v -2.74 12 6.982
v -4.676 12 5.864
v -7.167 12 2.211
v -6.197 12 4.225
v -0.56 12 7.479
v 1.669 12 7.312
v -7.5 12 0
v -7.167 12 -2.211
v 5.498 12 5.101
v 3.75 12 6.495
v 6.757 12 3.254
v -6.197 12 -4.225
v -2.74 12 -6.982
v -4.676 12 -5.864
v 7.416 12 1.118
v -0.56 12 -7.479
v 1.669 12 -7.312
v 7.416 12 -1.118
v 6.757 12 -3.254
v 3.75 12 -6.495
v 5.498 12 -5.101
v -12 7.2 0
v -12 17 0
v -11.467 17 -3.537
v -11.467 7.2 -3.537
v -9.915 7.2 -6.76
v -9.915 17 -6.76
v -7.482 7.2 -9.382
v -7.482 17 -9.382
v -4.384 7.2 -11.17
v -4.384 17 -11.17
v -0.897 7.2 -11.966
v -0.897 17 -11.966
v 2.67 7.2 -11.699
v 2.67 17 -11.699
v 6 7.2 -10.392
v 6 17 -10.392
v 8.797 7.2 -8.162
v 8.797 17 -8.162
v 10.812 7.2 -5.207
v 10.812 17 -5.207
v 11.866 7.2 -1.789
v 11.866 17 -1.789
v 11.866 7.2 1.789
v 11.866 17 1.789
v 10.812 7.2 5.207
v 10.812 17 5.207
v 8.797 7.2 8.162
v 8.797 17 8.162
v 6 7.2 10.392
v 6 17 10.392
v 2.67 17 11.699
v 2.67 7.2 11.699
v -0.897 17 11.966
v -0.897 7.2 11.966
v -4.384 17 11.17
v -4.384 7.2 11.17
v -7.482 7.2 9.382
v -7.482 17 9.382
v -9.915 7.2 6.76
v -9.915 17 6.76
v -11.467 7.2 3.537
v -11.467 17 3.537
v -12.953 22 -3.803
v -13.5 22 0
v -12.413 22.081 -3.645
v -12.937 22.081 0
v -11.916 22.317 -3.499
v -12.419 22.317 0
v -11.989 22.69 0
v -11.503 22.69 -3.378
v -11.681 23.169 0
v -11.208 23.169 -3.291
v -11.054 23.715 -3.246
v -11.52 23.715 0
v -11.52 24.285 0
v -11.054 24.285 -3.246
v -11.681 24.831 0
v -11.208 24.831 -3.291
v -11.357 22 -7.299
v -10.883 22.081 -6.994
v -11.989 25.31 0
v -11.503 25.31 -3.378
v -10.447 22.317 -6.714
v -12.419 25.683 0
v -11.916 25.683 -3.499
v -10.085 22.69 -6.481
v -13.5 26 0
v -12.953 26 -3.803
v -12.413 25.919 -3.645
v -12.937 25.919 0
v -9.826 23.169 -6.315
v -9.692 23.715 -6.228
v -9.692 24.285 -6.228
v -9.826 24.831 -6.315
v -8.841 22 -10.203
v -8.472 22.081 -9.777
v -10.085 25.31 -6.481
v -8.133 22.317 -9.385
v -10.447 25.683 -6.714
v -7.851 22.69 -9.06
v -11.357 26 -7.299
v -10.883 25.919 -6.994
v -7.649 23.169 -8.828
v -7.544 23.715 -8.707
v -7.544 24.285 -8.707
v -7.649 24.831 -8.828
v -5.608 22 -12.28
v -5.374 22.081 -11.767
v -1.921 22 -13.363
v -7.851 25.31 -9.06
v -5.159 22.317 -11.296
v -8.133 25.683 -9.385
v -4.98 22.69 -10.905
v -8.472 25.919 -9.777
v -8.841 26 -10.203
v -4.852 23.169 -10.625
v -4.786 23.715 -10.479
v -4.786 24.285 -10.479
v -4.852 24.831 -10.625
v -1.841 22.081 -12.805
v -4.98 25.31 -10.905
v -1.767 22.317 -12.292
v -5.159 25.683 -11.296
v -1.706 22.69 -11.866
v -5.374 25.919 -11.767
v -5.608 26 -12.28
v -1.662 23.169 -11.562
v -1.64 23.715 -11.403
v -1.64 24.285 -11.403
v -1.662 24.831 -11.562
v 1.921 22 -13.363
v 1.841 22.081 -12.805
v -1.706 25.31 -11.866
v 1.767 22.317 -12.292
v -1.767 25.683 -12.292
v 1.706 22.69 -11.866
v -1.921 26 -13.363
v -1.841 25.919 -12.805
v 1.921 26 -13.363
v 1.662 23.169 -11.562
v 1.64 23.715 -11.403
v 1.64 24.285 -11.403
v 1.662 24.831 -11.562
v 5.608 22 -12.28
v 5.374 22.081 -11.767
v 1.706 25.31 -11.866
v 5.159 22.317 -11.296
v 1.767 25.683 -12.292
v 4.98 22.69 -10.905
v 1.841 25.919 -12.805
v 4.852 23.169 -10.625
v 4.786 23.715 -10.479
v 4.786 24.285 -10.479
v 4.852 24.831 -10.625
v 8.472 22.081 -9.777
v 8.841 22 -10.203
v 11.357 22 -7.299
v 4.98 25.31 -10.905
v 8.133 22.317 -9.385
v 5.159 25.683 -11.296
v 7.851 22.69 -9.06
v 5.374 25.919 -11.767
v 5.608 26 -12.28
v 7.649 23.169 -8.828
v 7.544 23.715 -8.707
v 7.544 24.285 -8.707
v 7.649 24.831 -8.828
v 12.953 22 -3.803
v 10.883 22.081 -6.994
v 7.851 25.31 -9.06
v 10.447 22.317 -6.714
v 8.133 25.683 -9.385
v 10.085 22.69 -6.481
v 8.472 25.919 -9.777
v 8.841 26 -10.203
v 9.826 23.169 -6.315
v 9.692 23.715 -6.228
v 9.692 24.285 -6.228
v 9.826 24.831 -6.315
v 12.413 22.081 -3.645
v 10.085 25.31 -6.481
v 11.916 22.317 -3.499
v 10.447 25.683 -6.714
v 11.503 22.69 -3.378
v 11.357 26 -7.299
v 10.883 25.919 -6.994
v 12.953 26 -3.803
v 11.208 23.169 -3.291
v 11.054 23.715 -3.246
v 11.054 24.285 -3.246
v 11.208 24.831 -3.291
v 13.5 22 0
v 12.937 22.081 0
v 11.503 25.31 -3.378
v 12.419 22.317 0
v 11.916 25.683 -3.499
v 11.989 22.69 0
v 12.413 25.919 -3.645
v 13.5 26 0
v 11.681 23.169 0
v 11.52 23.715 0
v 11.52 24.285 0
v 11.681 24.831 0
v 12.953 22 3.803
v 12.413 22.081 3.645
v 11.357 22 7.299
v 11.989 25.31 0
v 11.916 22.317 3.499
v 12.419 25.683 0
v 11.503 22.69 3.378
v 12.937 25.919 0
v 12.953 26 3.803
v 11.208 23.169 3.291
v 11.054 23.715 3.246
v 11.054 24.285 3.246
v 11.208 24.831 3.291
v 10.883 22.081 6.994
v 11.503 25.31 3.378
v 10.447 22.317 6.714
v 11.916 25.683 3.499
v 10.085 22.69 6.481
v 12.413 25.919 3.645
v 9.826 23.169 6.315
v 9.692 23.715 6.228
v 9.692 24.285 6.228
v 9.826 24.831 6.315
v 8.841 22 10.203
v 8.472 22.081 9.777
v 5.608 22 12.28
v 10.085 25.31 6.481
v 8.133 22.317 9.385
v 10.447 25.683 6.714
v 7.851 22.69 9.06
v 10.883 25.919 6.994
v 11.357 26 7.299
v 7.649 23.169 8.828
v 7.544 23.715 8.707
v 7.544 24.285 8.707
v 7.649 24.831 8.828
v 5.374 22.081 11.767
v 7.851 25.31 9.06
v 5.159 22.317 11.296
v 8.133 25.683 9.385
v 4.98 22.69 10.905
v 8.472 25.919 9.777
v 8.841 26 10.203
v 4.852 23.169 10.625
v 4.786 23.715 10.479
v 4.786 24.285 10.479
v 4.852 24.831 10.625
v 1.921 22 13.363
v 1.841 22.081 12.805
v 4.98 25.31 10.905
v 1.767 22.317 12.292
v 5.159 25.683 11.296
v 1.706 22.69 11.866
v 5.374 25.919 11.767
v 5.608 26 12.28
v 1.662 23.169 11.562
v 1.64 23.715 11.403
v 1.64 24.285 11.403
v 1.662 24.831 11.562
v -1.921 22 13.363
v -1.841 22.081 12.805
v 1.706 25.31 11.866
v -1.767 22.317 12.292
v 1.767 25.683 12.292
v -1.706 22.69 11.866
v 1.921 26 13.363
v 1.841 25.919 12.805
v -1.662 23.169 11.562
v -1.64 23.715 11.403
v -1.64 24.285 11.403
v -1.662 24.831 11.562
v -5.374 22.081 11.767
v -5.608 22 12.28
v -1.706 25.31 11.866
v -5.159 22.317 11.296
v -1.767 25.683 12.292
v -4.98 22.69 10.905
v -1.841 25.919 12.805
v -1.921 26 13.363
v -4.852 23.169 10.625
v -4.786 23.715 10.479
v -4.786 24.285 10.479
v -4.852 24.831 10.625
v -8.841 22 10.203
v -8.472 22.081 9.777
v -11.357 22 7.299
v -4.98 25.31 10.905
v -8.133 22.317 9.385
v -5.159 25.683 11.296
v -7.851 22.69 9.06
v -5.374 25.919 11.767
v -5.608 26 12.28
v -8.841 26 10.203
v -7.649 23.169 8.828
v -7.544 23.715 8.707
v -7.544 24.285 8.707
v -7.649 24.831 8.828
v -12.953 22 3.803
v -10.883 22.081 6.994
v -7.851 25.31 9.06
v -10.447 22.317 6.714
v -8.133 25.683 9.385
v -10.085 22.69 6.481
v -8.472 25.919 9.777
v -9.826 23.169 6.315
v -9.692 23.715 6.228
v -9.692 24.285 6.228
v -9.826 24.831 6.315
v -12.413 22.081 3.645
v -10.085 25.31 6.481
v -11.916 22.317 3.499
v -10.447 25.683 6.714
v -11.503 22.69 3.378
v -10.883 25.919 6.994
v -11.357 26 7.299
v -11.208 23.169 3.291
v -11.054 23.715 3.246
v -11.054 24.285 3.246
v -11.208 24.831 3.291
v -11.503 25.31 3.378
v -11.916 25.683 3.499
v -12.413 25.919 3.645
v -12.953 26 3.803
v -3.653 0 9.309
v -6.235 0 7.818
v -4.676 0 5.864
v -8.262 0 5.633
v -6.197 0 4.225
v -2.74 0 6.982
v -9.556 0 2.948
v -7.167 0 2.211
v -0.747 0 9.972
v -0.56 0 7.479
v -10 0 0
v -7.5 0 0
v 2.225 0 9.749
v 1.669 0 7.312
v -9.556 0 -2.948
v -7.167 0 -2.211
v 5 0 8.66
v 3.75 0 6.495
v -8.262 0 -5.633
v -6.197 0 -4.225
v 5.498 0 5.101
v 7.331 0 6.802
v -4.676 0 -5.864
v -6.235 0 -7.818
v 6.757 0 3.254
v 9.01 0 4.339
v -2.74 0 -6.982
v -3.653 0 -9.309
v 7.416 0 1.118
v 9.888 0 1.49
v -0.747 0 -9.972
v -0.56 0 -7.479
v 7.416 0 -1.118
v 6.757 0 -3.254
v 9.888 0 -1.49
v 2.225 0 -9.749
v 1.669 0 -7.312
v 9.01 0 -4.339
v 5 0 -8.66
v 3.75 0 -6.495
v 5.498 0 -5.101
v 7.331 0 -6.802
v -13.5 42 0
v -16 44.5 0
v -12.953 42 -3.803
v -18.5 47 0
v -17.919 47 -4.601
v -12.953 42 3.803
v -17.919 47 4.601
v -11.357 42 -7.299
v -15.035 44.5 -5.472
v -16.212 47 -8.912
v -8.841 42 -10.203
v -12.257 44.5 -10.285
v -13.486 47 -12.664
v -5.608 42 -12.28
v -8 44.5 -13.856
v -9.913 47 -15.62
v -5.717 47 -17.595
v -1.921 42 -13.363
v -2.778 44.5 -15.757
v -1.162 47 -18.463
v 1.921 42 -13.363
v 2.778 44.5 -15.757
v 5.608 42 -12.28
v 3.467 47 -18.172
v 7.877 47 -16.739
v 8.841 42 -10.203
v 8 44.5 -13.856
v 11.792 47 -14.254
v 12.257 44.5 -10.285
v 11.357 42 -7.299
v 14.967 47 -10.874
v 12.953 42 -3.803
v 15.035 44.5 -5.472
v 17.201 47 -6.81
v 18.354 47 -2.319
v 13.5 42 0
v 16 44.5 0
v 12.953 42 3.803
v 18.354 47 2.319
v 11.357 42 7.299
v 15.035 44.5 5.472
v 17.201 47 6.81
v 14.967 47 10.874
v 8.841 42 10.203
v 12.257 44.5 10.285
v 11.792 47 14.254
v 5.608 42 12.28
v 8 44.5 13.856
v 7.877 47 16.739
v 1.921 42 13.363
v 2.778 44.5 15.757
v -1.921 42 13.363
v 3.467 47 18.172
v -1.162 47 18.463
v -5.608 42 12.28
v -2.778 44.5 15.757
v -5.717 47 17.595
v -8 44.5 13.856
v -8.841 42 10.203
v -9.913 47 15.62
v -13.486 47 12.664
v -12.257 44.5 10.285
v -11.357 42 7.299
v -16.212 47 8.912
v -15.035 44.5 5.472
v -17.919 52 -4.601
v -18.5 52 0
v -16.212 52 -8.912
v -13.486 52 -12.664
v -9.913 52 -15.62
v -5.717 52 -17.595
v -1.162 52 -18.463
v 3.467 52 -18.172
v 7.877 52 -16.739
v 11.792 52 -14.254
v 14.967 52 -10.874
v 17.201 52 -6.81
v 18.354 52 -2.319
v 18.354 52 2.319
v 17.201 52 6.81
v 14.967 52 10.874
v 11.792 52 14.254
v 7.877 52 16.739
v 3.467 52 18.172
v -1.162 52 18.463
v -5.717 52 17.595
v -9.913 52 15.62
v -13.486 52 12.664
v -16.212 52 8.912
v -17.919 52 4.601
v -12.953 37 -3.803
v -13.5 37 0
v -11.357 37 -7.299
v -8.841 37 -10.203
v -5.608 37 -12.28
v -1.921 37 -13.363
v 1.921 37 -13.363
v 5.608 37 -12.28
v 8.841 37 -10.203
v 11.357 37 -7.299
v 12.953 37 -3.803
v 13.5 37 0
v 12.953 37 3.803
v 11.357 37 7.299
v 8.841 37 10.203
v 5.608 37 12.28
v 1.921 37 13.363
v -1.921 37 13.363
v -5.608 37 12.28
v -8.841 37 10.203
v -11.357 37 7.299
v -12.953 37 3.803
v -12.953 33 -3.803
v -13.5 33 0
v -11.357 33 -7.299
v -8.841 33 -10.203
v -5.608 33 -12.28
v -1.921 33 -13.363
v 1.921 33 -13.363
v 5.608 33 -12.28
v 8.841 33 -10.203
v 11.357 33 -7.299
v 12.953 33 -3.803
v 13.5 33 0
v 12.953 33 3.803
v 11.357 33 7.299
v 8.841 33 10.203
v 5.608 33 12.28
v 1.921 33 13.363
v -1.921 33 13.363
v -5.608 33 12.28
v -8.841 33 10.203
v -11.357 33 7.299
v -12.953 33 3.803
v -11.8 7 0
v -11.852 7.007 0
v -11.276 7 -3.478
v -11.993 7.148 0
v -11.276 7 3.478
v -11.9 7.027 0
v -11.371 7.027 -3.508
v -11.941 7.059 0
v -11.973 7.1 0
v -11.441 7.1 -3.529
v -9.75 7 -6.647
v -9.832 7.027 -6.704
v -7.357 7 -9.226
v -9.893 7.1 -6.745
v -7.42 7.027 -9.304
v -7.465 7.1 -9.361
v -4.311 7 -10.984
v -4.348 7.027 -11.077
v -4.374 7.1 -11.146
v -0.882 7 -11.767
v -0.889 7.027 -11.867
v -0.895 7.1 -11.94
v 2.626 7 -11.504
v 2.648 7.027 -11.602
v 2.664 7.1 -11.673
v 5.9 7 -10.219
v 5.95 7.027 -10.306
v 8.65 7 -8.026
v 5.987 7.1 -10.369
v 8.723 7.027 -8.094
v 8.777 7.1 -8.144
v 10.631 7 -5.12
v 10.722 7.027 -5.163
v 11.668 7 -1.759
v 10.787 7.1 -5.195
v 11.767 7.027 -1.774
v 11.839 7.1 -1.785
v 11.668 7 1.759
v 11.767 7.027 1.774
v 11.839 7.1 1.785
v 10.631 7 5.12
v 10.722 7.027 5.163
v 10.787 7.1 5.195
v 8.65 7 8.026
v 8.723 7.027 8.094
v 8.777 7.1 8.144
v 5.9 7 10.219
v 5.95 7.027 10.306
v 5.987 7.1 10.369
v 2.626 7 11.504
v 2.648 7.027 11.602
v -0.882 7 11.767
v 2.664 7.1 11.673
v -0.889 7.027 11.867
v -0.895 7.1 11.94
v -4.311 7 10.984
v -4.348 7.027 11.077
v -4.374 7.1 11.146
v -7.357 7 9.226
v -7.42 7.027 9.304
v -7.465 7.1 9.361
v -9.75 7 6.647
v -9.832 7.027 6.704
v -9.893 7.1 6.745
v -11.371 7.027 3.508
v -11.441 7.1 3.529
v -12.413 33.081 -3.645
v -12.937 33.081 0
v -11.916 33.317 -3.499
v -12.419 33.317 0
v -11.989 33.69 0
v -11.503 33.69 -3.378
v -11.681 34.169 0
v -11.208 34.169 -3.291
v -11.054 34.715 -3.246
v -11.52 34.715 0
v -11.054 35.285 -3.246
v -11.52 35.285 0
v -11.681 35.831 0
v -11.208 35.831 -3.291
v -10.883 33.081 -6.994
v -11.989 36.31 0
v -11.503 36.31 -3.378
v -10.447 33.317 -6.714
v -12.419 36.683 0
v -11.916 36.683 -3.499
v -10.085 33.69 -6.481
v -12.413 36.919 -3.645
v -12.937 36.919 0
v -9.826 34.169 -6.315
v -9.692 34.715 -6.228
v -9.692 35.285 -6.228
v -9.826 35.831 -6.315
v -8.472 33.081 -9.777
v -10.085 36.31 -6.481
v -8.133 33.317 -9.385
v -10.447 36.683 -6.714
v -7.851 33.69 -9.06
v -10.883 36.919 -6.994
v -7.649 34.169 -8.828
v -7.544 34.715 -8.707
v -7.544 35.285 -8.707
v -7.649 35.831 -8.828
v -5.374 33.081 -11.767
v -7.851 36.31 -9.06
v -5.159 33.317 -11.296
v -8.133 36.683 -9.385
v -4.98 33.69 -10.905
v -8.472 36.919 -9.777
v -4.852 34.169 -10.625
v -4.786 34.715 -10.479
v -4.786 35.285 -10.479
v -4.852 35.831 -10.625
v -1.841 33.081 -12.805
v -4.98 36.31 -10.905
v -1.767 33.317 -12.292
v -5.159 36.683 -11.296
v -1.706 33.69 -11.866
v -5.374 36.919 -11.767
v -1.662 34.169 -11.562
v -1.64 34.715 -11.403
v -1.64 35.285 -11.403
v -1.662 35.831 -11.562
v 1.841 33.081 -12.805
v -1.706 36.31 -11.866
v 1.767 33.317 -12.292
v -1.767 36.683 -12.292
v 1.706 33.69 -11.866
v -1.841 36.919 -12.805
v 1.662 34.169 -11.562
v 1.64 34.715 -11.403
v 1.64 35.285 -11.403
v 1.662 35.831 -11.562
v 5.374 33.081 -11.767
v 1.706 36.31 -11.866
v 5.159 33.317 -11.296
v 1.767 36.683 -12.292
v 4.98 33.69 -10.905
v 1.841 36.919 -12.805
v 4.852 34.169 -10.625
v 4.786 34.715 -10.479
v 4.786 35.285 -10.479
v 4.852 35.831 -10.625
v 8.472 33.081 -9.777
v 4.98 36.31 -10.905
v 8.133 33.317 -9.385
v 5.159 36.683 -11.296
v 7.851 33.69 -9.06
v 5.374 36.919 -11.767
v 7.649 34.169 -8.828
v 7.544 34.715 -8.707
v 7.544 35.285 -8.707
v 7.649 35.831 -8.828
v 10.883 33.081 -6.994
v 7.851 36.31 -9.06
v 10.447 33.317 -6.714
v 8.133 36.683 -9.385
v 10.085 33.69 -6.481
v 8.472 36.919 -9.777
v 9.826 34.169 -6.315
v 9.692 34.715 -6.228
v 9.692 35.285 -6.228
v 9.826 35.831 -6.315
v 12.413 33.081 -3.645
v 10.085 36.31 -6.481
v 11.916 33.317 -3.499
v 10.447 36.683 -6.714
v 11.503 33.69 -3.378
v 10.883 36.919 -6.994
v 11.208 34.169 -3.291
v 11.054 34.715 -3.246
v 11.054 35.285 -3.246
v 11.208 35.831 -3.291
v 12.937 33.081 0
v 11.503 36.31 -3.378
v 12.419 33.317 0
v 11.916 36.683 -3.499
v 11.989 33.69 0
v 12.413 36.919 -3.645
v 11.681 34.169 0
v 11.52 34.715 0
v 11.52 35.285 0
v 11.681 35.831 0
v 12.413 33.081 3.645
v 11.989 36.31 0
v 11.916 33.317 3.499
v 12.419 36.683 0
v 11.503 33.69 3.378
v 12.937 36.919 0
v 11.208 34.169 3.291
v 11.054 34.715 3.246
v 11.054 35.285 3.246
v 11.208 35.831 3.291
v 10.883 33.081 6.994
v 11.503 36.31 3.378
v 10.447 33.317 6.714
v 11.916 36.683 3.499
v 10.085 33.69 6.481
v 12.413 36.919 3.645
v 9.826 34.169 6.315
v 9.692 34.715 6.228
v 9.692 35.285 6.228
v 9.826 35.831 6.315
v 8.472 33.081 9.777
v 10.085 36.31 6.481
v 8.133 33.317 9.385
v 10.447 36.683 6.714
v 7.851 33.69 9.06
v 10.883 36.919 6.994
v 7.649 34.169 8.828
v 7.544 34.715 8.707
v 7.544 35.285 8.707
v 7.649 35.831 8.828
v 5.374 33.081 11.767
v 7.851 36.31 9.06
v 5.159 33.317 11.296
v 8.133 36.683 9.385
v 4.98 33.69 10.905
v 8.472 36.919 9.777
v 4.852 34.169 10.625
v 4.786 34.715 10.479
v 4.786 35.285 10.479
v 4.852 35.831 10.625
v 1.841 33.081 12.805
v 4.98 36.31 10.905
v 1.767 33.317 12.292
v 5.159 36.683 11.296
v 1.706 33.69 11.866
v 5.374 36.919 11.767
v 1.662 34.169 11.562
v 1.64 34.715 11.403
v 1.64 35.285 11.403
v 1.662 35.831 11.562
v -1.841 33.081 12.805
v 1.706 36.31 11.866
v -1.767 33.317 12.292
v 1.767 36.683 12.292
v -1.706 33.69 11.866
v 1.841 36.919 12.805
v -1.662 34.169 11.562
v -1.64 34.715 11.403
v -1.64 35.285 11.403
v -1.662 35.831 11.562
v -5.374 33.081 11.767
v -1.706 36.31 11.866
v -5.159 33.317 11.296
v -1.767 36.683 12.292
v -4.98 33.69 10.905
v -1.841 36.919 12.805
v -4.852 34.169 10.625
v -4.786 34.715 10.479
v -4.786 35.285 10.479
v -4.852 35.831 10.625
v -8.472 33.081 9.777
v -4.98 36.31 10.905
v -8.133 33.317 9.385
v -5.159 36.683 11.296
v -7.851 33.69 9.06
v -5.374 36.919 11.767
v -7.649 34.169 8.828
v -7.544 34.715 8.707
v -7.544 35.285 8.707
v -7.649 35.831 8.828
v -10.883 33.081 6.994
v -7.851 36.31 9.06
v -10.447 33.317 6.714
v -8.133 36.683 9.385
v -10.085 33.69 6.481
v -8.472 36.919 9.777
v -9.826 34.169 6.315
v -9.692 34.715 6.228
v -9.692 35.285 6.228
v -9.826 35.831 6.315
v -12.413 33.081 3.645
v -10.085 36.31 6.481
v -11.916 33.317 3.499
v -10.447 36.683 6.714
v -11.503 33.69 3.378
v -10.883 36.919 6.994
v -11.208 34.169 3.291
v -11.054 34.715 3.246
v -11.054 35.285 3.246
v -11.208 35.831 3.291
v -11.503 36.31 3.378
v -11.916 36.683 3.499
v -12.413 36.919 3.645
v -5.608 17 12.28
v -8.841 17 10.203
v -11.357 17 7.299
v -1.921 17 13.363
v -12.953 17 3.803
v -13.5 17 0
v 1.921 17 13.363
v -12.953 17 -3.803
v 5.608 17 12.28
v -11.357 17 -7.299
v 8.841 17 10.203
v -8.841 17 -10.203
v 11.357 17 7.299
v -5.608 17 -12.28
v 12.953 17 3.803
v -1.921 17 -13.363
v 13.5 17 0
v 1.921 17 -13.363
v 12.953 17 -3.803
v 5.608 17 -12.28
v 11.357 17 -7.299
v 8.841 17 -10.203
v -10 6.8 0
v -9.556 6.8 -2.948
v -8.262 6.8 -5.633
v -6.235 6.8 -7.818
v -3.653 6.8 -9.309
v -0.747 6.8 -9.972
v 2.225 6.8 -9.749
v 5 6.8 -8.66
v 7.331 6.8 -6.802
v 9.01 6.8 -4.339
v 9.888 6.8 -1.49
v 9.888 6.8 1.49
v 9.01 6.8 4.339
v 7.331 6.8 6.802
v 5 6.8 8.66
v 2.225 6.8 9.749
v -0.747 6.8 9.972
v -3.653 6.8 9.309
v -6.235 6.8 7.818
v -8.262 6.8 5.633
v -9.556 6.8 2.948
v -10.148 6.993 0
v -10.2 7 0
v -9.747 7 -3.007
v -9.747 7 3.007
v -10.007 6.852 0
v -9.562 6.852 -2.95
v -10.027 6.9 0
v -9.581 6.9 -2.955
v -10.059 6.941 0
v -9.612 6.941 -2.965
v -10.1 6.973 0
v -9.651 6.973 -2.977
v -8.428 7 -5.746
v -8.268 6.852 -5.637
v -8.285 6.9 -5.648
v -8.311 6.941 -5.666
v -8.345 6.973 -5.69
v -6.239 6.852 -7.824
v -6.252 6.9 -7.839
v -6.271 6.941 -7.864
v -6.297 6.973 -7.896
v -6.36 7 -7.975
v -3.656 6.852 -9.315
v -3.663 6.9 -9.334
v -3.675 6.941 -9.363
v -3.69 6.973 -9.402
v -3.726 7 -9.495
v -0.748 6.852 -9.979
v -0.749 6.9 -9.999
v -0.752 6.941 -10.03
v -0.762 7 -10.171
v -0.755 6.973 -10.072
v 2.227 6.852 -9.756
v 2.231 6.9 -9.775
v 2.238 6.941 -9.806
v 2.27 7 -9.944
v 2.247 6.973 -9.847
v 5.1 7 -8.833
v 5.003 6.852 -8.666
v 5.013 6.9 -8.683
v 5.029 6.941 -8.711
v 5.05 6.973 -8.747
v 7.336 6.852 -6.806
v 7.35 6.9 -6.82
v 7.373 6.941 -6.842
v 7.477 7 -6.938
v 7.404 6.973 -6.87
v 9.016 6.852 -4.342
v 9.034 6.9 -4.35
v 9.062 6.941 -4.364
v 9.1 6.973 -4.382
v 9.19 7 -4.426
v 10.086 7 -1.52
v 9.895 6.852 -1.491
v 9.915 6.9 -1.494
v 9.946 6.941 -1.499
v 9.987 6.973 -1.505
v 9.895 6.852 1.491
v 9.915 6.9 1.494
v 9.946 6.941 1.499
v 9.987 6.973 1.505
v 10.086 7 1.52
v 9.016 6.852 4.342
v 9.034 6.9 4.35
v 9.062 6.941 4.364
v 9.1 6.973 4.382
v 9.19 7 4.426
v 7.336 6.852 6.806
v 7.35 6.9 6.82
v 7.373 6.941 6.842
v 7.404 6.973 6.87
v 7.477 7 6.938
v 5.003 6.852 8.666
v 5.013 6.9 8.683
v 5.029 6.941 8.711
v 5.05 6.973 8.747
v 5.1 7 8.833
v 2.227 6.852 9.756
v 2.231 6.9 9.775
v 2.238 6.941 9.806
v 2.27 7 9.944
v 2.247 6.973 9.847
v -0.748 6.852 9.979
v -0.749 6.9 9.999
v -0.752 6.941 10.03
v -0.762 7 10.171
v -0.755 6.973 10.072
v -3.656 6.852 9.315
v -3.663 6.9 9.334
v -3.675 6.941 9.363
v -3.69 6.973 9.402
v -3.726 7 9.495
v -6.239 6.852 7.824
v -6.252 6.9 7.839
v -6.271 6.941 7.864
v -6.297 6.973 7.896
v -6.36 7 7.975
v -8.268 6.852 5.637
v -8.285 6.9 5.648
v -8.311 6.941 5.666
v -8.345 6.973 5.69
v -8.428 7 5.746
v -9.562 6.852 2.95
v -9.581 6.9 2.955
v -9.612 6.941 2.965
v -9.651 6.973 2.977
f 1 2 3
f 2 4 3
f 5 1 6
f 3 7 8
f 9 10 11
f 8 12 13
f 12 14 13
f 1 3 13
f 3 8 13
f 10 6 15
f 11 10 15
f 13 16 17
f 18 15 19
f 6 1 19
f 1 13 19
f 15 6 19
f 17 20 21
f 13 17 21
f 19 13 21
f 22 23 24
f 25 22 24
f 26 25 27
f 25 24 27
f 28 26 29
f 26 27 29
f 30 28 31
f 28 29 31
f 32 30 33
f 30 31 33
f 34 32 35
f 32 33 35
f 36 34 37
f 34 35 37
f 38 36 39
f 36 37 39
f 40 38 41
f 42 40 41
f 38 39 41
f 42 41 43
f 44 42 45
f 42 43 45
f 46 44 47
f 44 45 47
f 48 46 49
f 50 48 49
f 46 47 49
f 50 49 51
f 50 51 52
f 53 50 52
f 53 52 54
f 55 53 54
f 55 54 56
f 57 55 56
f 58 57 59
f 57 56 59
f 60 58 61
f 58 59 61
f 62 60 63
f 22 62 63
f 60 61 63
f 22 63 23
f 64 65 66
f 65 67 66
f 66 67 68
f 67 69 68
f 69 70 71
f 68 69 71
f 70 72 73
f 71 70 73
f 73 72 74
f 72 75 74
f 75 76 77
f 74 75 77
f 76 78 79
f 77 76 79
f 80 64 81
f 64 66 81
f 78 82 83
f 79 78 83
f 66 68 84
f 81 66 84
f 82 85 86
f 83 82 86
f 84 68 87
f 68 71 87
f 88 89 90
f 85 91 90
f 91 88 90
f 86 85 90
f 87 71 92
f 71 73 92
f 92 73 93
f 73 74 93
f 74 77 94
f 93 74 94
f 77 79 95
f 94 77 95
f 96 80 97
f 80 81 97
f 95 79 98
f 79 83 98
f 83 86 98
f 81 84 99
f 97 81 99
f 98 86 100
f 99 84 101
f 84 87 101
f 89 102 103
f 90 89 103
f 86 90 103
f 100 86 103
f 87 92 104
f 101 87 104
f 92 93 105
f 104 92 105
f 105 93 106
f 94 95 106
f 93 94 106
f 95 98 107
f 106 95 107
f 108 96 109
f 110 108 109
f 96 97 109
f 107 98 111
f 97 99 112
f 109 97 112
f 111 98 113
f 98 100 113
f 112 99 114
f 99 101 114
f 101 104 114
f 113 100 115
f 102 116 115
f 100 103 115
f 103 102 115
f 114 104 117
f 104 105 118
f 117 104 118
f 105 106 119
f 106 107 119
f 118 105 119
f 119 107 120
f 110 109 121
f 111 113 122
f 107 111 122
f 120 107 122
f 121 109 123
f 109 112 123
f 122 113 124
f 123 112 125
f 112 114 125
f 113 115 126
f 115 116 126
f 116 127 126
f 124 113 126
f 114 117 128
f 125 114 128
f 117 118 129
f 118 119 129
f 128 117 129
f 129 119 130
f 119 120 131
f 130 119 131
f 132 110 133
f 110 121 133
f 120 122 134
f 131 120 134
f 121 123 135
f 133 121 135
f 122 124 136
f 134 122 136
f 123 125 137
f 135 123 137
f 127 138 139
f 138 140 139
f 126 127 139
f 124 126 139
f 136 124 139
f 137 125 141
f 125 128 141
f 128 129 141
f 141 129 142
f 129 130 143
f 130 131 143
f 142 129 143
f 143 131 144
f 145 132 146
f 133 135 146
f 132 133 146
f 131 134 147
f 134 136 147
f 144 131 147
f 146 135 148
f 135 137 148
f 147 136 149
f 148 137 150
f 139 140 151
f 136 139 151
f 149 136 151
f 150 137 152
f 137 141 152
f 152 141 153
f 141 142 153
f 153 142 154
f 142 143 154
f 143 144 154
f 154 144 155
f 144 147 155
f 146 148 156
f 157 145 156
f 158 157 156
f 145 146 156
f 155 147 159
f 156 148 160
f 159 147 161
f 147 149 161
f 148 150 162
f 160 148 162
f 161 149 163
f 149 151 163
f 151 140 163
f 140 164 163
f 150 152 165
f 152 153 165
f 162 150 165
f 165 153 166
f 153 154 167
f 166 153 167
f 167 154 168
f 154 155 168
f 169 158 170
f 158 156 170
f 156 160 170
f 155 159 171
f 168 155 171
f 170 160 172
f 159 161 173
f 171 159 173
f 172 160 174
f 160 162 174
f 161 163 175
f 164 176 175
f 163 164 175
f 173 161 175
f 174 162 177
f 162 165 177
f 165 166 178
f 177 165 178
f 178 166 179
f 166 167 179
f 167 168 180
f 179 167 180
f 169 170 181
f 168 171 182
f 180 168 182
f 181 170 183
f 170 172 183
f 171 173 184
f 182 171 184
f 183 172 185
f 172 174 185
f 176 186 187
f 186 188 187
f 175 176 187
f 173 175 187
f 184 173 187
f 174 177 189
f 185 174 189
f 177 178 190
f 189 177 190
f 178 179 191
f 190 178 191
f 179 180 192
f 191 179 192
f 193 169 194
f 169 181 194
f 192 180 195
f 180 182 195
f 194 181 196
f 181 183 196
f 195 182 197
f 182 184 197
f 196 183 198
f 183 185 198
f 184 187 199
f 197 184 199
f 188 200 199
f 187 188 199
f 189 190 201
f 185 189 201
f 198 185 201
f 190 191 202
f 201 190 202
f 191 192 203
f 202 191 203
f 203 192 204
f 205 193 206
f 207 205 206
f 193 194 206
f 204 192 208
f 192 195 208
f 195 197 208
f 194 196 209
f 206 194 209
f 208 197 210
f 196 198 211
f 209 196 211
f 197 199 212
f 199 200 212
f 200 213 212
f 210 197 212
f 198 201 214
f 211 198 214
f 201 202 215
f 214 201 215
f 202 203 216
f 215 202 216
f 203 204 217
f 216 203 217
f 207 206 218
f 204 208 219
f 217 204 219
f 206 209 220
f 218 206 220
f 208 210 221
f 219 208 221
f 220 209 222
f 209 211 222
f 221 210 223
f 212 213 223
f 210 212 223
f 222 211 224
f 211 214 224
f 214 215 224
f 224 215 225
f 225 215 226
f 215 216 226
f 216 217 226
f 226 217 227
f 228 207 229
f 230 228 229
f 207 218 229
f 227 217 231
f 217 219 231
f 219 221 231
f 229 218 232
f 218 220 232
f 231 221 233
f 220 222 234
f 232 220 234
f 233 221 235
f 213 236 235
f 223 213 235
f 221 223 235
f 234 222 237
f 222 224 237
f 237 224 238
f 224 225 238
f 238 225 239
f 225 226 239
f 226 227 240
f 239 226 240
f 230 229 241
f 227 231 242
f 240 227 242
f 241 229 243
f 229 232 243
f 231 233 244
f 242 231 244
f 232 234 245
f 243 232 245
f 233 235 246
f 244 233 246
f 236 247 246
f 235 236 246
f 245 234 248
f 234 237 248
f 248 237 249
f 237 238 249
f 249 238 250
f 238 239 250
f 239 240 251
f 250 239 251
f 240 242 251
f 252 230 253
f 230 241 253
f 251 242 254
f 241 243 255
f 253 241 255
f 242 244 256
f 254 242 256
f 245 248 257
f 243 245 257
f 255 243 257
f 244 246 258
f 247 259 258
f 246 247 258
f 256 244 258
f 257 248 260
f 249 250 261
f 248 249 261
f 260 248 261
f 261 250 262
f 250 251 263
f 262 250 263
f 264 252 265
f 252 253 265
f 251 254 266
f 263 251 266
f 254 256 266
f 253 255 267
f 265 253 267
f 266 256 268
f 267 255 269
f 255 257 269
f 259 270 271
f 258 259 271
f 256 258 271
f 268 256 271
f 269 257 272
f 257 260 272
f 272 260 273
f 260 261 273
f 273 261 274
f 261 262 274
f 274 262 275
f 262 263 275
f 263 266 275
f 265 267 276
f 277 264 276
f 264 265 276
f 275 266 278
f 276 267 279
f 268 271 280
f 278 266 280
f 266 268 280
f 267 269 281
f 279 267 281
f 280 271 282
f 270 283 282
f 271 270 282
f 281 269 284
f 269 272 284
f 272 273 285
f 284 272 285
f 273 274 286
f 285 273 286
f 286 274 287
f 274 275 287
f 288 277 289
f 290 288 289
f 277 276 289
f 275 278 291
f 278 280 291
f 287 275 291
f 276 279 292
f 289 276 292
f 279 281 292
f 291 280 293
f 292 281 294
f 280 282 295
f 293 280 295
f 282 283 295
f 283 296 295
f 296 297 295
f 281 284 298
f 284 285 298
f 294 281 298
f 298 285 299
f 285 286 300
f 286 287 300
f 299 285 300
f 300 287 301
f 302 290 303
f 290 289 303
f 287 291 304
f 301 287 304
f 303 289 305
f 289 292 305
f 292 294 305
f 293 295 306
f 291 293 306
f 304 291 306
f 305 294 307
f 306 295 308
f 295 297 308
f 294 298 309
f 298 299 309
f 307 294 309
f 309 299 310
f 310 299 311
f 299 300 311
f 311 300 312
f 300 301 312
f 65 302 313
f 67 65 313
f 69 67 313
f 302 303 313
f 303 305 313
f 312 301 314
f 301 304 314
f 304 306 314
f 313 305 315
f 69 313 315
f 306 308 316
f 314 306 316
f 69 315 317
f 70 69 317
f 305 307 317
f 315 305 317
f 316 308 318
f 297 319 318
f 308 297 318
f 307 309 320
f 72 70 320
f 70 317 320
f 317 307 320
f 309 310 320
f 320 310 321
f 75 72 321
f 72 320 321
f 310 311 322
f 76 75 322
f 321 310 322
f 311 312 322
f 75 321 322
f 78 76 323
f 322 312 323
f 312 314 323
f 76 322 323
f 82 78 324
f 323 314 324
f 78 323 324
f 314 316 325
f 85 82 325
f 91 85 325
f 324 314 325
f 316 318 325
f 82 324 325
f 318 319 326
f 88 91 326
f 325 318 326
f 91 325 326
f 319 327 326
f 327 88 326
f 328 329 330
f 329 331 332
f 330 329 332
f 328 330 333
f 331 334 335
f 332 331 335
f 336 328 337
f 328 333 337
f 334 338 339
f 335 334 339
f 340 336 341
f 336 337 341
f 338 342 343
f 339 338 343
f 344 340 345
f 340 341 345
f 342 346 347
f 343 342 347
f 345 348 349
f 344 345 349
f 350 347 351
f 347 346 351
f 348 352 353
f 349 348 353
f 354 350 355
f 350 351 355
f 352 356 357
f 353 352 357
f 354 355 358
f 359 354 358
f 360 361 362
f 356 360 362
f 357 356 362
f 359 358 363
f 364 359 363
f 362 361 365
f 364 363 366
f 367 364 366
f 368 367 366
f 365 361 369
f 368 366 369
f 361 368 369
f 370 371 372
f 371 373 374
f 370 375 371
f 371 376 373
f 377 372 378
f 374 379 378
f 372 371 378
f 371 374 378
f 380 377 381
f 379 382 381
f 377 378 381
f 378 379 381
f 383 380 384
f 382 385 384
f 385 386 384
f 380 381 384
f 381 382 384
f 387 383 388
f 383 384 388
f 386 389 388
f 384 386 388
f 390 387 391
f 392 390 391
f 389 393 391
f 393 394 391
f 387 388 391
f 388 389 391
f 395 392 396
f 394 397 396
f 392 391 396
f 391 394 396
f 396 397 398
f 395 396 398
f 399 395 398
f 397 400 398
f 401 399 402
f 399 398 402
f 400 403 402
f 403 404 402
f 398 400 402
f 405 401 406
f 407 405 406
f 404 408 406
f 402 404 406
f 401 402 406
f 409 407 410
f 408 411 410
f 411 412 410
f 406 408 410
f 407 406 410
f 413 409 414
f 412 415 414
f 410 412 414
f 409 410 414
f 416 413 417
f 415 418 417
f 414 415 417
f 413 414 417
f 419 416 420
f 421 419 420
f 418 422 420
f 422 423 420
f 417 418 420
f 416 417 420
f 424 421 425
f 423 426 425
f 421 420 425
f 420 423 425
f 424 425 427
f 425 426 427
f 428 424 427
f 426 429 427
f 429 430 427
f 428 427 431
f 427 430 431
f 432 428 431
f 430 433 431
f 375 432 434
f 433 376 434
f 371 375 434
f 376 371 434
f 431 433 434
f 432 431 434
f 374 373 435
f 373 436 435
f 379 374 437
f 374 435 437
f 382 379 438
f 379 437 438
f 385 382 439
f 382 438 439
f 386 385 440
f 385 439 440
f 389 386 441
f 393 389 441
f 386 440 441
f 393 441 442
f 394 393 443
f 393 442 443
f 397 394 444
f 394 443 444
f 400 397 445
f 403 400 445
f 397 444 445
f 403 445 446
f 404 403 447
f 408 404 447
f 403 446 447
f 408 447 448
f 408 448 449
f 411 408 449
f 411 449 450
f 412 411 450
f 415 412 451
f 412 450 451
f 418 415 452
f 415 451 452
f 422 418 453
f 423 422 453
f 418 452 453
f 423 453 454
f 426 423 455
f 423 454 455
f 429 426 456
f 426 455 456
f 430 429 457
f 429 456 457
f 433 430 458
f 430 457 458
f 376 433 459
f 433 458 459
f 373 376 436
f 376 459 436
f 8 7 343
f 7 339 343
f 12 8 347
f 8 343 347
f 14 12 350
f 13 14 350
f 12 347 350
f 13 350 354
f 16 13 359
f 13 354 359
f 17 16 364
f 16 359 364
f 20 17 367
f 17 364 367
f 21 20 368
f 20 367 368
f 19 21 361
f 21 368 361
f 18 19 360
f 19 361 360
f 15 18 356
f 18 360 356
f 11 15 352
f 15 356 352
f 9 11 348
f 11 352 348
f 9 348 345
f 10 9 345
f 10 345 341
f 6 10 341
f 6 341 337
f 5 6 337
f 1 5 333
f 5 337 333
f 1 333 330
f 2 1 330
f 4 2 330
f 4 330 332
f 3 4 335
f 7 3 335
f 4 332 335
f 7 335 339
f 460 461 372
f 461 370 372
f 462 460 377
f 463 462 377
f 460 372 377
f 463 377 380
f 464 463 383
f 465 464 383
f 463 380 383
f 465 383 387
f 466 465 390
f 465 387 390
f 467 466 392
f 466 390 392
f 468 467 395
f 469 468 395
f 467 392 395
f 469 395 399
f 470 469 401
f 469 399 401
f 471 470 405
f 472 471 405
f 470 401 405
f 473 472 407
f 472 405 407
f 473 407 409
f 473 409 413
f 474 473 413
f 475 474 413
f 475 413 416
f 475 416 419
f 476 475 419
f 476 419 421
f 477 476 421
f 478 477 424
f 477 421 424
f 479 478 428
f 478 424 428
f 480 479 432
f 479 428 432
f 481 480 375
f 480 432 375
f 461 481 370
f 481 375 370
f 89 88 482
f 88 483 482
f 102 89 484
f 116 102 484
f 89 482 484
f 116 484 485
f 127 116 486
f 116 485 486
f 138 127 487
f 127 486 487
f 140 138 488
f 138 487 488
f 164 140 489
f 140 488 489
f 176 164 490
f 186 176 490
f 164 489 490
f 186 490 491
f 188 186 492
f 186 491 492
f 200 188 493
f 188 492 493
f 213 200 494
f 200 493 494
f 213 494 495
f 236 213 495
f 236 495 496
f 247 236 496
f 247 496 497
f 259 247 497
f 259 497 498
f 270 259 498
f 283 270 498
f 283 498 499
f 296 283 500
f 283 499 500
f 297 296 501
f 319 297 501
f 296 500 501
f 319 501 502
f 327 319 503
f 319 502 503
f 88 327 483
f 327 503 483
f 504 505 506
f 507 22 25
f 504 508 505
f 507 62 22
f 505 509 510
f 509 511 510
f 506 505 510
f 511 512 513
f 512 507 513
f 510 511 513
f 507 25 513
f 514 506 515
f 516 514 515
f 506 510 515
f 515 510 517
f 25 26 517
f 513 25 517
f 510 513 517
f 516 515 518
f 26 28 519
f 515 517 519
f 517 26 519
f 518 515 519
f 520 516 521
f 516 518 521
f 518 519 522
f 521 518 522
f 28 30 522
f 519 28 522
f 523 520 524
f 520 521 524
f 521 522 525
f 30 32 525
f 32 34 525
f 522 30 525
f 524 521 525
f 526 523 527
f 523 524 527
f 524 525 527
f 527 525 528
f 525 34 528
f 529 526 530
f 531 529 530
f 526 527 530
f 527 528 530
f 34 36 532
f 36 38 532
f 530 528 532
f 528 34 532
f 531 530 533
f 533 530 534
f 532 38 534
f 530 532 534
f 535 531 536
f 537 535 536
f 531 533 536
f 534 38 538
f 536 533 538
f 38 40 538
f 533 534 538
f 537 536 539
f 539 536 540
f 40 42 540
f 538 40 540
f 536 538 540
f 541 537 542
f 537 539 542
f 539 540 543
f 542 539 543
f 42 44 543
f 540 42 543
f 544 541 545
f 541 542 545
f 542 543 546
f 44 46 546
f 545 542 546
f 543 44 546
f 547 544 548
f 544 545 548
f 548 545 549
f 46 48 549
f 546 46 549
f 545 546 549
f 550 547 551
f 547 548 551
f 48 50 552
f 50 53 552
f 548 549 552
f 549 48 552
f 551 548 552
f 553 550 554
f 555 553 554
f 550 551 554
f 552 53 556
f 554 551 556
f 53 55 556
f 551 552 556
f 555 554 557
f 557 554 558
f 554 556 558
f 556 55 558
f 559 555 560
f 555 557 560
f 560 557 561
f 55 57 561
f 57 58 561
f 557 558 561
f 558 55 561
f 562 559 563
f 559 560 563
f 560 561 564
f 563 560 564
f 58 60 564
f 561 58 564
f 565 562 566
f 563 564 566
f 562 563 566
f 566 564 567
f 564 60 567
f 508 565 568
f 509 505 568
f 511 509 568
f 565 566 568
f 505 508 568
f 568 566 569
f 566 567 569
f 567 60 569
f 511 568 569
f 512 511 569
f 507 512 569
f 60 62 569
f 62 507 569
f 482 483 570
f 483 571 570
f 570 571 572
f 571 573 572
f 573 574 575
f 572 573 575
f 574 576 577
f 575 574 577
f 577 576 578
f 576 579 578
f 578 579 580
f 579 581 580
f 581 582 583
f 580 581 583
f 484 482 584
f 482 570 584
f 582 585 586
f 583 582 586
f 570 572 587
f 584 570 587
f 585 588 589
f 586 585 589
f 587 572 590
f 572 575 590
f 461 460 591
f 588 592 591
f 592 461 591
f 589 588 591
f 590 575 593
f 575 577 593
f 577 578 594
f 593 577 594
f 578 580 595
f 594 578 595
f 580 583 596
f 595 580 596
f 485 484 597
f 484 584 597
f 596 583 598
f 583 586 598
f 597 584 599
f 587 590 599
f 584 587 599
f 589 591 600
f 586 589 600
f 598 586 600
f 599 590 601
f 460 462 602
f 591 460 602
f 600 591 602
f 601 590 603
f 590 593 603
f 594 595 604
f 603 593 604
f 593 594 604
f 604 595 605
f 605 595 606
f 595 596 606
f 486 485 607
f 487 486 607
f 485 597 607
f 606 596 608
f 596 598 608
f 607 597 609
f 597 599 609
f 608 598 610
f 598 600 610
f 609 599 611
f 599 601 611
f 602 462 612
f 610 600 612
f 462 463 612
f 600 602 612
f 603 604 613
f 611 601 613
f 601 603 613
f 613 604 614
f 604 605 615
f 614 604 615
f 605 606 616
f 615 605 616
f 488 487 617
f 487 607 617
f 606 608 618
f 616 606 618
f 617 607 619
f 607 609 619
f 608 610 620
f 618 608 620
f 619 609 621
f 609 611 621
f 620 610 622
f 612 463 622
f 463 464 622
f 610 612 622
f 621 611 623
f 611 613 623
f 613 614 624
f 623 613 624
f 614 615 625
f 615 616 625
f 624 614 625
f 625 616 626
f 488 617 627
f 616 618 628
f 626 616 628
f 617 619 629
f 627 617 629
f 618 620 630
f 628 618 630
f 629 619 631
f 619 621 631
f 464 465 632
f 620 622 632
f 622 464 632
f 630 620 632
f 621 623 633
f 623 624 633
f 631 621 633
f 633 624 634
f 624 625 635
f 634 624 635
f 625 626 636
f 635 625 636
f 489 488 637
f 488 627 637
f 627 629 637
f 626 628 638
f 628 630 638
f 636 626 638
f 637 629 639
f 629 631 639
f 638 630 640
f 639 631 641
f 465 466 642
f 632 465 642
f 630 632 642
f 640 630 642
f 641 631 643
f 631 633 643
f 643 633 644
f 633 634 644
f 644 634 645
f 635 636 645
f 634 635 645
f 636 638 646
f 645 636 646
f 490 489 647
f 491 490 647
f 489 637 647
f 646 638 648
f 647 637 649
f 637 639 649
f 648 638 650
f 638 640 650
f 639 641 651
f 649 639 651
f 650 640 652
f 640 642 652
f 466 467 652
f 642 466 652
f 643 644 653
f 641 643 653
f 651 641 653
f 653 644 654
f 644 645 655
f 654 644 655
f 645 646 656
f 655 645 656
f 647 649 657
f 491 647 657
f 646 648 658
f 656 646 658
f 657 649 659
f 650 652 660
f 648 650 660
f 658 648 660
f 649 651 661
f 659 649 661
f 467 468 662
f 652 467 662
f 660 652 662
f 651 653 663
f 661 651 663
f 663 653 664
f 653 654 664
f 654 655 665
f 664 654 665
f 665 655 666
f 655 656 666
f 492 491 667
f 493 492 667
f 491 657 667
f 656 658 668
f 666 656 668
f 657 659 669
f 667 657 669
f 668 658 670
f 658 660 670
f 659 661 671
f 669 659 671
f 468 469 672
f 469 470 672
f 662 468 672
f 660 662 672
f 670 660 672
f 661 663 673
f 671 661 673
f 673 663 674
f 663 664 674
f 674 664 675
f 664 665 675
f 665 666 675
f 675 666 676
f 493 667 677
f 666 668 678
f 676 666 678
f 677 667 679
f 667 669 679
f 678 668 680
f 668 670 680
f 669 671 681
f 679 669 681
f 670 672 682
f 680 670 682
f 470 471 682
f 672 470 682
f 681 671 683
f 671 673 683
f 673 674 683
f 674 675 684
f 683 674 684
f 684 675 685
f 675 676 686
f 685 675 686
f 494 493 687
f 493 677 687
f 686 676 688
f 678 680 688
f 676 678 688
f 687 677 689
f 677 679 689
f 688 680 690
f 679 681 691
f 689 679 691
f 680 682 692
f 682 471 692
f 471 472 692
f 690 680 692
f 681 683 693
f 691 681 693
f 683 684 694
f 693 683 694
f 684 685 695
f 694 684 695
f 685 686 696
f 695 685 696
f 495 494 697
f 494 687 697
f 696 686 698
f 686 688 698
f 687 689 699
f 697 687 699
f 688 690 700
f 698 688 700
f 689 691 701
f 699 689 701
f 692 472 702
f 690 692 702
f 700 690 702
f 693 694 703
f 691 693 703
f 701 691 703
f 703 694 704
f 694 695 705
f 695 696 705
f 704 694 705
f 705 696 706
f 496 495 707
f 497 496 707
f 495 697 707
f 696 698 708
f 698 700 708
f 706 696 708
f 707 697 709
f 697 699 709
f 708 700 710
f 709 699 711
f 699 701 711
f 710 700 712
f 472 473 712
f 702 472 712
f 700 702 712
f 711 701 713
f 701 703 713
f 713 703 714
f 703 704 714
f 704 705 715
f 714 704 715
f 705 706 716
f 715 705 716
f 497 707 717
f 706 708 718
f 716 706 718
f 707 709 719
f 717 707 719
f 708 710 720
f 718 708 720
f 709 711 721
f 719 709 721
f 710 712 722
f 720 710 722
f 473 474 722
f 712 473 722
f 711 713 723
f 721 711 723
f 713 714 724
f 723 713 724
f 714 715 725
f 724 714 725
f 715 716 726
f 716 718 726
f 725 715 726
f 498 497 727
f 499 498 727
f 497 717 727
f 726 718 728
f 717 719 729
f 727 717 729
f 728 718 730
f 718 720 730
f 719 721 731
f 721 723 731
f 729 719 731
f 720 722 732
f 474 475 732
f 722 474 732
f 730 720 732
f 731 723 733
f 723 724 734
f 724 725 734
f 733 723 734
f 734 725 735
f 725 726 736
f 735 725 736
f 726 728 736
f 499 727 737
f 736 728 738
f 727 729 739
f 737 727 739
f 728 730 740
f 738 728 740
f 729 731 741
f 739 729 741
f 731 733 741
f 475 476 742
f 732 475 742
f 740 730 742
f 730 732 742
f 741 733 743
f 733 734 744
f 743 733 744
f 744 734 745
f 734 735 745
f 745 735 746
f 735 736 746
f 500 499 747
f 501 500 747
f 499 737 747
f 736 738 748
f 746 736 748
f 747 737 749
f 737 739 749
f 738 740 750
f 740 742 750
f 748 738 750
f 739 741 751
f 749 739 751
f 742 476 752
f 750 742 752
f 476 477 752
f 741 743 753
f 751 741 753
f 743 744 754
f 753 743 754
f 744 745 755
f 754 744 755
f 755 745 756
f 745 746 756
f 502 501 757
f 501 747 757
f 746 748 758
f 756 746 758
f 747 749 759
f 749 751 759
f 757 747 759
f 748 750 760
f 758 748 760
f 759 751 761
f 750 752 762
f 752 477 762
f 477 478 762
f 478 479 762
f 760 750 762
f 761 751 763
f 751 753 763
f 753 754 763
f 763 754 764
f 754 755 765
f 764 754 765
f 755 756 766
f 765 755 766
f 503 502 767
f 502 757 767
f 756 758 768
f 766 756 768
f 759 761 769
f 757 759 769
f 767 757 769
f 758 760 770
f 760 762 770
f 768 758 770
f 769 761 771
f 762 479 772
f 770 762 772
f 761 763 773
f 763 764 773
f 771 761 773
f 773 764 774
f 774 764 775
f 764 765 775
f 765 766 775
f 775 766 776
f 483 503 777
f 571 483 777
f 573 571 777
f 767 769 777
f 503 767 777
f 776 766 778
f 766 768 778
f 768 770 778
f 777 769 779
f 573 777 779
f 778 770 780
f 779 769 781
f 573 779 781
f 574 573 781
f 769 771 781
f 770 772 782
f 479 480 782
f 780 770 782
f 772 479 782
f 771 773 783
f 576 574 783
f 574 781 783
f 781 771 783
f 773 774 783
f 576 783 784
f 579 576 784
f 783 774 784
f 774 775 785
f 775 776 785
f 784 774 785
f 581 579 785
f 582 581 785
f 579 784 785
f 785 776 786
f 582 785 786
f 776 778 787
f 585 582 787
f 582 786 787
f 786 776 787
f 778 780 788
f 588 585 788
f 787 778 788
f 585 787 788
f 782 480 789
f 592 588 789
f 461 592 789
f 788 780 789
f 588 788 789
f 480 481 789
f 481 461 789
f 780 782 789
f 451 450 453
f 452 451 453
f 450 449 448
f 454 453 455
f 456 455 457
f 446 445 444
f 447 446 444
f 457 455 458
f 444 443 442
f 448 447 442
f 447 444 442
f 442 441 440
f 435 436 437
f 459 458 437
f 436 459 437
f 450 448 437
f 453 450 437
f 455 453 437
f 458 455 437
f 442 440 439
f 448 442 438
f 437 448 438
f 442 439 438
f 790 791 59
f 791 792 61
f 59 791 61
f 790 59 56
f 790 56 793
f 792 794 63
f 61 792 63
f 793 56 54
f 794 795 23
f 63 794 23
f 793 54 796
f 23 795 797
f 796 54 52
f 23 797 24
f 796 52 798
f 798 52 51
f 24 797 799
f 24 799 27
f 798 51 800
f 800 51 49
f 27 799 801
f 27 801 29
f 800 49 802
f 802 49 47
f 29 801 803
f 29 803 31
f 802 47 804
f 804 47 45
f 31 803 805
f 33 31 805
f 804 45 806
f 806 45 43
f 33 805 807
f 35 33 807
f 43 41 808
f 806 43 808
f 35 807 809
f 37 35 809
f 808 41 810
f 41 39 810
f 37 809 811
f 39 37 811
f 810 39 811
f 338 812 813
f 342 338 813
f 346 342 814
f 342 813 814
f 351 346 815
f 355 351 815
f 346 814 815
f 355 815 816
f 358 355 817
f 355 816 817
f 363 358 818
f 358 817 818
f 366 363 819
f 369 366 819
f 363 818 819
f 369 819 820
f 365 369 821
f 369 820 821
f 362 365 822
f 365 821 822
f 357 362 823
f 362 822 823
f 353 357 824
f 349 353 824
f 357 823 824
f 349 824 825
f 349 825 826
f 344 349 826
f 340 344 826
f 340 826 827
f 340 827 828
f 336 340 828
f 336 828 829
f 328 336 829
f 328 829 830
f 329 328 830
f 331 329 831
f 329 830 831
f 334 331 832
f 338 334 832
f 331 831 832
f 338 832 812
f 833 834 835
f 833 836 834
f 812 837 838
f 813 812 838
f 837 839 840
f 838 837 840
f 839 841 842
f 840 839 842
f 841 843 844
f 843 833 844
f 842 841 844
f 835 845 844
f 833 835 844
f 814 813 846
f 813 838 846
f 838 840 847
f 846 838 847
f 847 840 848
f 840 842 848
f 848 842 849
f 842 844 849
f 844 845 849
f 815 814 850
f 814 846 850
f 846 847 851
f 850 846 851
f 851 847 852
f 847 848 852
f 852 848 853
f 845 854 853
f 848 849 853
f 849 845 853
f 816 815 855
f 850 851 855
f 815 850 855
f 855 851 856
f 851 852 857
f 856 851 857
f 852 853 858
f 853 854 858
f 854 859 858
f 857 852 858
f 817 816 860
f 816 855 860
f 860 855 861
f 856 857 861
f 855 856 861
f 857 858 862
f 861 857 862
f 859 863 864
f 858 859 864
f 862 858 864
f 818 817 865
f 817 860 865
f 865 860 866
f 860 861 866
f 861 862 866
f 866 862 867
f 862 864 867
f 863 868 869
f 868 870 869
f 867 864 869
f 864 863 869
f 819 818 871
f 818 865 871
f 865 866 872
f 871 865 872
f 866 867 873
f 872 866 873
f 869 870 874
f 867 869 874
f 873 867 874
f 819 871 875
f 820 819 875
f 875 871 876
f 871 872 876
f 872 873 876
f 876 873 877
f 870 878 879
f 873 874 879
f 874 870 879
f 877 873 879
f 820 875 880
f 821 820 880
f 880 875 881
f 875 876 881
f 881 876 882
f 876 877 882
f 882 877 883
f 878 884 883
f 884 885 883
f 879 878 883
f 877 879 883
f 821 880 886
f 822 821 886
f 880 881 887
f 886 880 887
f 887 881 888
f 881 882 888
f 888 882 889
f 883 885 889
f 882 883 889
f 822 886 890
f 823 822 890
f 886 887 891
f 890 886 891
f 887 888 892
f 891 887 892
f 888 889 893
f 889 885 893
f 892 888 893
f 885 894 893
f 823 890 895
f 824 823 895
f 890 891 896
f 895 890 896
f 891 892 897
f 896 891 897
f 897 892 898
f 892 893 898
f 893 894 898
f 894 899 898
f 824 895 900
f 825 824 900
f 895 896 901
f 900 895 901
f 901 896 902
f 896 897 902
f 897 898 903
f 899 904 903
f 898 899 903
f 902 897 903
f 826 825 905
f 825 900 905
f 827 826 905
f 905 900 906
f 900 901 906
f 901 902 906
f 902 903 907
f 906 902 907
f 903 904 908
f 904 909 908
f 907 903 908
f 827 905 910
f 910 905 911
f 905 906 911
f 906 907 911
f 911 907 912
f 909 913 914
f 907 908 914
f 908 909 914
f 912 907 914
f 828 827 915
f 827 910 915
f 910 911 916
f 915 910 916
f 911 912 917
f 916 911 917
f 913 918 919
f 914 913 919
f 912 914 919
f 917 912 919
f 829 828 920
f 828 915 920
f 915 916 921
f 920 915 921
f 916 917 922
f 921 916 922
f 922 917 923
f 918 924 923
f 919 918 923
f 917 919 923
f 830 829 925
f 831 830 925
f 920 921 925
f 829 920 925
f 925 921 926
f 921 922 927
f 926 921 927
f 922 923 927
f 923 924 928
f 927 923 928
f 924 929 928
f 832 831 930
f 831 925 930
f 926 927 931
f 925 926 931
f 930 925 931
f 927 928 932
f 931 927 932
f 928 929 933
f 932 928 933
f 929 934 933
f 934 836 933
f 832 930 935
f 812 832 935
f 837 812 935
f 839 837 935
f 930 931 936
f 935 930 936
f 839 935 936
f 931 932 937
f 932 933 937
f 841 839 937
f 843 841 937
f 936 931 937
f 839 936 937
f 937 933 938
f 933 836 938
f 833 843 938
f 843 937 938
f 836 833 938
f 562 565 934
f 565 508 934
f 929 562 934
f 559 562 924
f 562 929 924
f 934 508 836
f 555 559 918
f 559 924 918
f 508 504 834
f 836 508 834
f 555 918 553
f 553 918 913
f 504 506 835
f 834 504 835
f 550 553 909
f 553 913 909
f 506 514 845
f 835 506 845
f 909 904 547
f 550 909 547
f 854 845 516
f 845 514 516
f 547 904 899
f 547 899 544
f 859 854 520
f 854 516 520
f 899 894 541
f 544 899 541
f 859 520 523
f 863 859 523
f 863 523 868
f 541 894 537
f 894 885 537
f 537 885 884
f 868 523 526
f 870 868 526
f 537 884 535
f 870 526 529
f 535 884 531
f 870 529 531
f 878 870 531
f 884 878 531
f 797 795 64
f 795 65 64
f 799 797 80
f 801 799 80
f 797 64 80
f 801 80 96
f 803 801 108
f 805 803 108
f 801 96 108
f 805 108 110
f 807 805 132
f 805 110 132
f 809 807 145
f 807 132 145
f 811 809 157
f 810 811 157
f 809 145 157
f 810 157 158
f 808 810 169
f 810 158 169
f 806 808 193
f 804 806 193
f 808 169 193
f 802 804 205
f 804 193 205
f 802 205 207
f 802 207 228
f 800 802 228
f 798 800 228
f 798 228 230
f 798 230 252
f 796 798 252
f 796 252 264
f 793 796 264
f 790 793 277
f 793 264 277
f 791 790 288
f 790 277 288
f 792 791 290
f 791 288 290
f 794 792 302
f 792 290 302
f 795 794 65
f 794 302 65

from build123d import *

# Parameters (mm, degrees)
CONG_3_R = 0.2


with BuildPart() as part:
    # Esquisse1 → Révolution1 (revolve)
    with BuildSketch(Plane.XY):
        with BuildLine():
            Line((-7.5, 0), (-10, 0))
            Line((-10, 0), (-10, 7))
            Line((-10, 7), (-12, 7))
            Line((-12, 7), (-12, 17))
            Line((-12, 17), (-13.5, 17))
            Line((-13.5, 17), (-13.5, 22))
            ThreePointArc((-13.5, 22), (-11.5, 24), (-13.5, 26))
            Line((-13.5, 26), (-13.5, 33))
            ThreePointArc((-13.5, 33), (-11.5, 35), (-13.5, 37))
            Line((-13.5, 37), (-13.5, 42))
            Line((-13.5, 42), (-18.5, 47))
            Line((-18.5, 47), (-18.5, 52))
            Line((-18.5, 52), (0, 52))
            Line((0, 52), (0, 42))
            Line((0, 42), (0, 12))
            Line((0, 12), (-7.5, 12))
            Line((-7.5, 12), (-7.5, 0))
        make_face()
    revolve(axis=Axis((0, 42, 0), (0, -1, 0)))

    # Congé3
    cong_3_edges = [part.edges().sort_by_distance(p)[0] for p in [
        (12, 7, 0),
        (10, 7, 0),
    ]]
    fillet(cong_3_edges, radius=CONG_3_R)


solid = part.part
